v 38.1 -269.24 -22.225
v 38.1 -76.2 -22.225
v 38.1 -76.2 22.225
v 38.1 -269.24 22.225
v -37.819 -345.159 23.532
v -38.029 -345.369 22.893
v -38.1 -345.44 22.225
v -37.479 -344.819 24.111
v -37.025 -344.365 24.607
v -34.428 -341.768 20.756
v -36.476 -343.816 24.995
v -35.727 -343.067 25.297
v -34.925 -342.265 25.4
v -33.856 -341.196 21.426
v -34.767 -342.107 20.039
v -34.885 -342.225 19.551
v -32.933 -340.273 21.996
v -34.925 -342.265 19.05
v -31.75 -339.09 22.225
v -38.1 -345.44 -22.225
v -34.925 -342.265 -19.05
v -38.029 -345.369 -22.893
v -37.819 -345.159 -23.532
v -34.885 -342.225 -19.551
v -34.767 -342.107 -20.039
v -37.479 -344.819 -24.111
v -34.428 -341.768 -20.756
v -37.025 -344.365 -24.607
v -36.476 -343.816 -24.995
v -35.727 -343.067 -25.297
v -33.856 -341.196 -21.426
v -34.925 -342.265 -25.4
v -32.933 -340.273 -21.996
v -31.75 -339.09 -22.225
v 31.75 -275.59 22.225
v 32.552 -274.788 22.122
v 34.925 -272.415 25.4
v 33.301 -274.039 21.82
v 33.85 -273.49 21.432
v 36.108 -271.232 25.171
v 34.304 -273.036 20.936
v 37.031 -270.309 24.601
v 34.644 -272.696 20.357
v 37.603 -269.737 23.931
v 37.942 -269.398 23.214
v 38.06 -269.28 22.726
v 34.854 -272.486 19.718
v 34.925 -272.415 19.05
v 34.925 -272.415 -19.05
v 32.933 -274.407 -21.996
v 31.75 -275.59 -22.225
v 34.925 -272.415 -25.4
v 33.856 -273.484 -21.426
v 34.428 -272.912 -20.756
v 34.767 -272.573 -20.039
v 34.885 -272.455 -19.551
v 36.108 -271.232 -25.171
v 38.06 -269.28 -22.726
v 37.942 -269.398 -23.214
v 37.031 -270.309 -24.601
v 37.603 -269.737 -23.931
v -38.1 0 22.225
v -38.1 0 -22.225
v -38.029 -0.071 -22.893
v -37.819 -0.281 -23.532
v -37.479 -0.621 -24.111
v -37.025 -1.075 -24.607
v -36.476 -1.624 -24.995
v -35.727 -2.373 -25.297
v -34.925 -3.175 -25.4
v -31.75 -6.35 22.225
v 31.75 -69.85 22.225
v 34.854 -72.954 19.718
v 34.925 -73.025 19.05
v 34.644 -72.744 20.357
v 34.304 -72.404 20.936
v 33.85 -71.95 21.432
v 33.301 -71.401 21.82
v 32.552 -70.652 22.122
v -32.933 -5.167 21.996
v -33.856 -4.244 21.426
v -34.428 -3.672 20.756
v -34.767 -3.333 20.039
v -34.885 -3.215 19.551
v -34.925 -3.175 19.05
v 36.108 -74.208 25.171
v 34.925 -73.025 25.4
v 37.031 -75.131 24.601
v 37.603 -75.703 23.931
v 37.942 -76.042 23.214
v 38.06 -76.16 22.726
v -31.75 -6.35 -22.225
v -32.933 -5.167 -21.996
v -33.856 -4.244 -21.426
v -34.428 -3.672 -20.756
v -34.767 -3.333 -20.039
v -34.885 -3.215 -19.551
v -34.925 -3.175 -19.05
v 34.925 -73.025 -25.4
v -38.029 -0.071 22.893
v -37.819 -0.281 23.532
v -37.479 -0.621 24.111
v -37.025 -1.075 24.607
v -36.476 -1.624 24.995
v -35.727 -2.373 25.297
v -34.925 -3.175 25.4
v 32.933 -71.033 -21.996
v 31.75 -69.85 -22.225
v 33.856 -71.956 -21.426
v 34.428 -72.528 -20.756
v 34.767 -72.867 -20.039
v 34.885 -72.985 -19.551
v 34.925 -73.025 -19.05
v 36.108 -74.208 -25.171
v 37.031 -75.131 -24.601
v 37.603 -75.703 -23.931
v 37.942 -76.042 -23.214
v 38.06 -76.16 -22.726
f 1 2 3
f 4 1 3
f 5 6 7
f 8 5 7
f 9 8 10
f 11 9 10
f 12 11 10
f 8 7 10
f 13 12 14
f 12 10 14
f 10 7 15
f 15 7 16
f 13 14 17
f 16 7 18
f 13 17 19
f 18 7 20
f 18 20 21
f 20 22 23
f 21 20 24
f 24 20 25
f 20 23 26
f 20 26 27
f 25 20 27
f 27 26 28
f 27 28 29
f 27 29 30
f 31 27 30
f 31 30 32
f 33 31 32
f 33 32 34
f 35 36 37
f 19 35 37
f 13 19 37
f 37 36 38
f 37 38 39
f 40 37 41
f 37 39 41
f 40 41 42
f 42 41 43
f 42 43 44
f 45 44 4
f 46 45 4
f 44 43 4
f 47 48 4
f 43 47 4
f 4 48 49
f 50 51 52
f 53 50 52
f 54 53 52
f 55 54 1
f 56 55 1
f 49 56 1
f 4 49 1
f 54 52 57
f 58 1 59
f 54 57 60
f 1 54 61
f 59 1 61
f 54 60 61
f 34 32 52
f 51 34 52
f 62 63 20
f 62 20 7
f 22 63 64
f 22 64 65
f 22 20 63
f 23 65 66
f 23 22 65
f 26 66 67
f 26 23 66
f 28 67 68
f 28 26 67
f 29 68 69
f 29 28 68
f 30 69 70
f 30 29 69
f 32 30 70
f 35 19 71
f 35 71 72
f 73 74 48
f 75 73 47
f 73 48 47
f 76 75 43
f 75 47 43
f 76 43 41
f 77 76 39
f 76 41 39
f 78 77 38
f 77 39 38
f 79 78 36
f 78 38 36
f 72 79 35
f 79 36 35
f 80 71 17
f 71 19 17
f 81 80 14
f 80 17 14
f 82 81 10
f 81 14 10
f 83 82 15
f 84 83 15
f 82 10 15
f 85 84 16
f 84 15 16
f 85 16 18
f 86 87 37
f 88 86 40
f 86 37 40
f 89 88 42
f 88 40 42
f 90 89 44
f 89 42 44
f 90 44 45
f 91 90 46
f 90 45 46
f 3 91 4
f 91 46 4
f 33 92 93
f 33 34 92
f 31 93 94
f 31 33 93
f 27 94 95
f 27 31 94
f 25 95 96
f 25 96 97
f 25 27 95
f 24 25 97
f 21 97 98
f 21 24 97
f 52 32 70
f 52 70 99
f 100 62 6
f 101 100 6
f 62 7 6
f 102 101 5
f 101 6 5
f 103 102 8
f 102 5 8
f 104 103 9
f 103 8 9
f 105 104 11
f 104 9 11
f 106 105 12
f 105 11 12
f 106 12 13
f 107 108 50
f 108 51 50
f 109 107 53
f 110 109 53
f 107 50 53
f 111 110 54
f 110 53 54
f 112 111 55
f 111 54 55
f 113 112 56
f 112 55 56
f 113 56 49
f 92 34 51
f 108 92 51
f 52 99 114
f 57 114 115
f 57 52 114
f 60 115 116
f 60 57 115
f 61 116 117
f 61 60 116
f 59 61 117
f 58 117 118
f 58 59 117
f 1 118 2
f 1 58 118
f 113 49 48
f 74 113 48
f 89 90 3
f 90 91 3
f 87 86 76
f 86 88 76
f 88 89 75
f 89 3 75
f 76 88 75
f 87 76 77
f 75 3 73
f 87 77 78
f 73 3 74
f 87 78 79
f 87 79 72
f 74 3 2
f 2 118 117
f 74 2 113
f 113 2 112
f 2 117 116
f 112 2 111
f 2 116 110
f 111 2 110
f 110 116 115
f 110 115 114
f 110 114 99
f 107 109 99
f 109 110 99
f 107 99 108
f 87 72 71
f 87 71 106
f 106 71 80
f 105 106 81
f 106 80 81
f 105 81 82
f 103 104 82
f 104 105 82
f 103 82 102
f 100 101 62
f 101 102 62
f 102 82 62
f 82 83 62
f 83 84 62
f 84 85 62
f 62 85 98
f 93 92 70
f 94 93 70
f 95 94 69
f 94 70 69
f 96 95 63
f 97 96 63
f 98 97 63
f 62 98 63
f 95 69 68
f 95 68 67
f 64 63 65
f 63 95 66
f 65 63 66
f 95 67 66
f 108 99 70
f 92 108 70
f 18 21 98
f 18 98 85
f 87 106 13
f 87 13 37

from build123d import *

# Parameters (mm, degrees)
F0_W     = 76.2
F0_H     = 50.8
F0_W_2   = 69.85
F0_H_2   = 44.45
F2_DEPTH = 345.44
F4_DEPTH = 50.801
F6_DEPTH = 50.801
F7_R     = 3.175


# Not quite as in the source:
# - a variable given as a bare number and used for a length is read in inches; the dataset says mm whatever the document's units were


with BuildPart() as f2:
    # F0 (on Front) → F2 (new body)
    with BuildSketch(Plane.XZ):
        Rectangle(F0_W, F0_H)
        Rectangle(F0_W_2, F0_H_2, mode=Mode.SUBTRACT)
    extrude(amount=F2_DEPTH)

    # F3 (on face) → F4 (cut, through all)
    with BuildSketch(Plane(origin=(0, 0, -25.4), x_dir=(1, 0, 0), z_dir=(0, 0, -1))):
        Polygon((38.1, 345.44), (-38.1, 345.44), (38.1, 269.24), align=None)
    extrude(amount=-F4_DEPTH, mode=Mode.SUBTRACT)

    # F5 (on face) → F6 (cut, through all)
    with BuildSketch(Plane(origin=(0, 0, -25.4), x_dir=(1, 0, 0), z_dir=(0, 0, -1))):
        Polygon((38.1, 76.2), (-38.1, 0), (38.1, 0), align=None)
    extrude(amount=-F6_DEPTH, mode=Mode.SUBTRACT)

    # F7
    f7_edges = [f2.edges().sort_by_distance(p)[0] for p in [
        (38.1, -172.72, -25.4),
        (-38.1, -172.72, -25.4),
        (-38.1, -172.72, 25.4),
        (38.1, -172.72, 25.4),
        (-34.925, -172.72, 22.225),
        (34.925, -172.72, 22.225),
        (-34.925, -172.72, -22.225),
        (34.925, -172.72, -22.225),
    ]]
    fillet(f7_edges, radius=F7_R)


solid = f2.part
